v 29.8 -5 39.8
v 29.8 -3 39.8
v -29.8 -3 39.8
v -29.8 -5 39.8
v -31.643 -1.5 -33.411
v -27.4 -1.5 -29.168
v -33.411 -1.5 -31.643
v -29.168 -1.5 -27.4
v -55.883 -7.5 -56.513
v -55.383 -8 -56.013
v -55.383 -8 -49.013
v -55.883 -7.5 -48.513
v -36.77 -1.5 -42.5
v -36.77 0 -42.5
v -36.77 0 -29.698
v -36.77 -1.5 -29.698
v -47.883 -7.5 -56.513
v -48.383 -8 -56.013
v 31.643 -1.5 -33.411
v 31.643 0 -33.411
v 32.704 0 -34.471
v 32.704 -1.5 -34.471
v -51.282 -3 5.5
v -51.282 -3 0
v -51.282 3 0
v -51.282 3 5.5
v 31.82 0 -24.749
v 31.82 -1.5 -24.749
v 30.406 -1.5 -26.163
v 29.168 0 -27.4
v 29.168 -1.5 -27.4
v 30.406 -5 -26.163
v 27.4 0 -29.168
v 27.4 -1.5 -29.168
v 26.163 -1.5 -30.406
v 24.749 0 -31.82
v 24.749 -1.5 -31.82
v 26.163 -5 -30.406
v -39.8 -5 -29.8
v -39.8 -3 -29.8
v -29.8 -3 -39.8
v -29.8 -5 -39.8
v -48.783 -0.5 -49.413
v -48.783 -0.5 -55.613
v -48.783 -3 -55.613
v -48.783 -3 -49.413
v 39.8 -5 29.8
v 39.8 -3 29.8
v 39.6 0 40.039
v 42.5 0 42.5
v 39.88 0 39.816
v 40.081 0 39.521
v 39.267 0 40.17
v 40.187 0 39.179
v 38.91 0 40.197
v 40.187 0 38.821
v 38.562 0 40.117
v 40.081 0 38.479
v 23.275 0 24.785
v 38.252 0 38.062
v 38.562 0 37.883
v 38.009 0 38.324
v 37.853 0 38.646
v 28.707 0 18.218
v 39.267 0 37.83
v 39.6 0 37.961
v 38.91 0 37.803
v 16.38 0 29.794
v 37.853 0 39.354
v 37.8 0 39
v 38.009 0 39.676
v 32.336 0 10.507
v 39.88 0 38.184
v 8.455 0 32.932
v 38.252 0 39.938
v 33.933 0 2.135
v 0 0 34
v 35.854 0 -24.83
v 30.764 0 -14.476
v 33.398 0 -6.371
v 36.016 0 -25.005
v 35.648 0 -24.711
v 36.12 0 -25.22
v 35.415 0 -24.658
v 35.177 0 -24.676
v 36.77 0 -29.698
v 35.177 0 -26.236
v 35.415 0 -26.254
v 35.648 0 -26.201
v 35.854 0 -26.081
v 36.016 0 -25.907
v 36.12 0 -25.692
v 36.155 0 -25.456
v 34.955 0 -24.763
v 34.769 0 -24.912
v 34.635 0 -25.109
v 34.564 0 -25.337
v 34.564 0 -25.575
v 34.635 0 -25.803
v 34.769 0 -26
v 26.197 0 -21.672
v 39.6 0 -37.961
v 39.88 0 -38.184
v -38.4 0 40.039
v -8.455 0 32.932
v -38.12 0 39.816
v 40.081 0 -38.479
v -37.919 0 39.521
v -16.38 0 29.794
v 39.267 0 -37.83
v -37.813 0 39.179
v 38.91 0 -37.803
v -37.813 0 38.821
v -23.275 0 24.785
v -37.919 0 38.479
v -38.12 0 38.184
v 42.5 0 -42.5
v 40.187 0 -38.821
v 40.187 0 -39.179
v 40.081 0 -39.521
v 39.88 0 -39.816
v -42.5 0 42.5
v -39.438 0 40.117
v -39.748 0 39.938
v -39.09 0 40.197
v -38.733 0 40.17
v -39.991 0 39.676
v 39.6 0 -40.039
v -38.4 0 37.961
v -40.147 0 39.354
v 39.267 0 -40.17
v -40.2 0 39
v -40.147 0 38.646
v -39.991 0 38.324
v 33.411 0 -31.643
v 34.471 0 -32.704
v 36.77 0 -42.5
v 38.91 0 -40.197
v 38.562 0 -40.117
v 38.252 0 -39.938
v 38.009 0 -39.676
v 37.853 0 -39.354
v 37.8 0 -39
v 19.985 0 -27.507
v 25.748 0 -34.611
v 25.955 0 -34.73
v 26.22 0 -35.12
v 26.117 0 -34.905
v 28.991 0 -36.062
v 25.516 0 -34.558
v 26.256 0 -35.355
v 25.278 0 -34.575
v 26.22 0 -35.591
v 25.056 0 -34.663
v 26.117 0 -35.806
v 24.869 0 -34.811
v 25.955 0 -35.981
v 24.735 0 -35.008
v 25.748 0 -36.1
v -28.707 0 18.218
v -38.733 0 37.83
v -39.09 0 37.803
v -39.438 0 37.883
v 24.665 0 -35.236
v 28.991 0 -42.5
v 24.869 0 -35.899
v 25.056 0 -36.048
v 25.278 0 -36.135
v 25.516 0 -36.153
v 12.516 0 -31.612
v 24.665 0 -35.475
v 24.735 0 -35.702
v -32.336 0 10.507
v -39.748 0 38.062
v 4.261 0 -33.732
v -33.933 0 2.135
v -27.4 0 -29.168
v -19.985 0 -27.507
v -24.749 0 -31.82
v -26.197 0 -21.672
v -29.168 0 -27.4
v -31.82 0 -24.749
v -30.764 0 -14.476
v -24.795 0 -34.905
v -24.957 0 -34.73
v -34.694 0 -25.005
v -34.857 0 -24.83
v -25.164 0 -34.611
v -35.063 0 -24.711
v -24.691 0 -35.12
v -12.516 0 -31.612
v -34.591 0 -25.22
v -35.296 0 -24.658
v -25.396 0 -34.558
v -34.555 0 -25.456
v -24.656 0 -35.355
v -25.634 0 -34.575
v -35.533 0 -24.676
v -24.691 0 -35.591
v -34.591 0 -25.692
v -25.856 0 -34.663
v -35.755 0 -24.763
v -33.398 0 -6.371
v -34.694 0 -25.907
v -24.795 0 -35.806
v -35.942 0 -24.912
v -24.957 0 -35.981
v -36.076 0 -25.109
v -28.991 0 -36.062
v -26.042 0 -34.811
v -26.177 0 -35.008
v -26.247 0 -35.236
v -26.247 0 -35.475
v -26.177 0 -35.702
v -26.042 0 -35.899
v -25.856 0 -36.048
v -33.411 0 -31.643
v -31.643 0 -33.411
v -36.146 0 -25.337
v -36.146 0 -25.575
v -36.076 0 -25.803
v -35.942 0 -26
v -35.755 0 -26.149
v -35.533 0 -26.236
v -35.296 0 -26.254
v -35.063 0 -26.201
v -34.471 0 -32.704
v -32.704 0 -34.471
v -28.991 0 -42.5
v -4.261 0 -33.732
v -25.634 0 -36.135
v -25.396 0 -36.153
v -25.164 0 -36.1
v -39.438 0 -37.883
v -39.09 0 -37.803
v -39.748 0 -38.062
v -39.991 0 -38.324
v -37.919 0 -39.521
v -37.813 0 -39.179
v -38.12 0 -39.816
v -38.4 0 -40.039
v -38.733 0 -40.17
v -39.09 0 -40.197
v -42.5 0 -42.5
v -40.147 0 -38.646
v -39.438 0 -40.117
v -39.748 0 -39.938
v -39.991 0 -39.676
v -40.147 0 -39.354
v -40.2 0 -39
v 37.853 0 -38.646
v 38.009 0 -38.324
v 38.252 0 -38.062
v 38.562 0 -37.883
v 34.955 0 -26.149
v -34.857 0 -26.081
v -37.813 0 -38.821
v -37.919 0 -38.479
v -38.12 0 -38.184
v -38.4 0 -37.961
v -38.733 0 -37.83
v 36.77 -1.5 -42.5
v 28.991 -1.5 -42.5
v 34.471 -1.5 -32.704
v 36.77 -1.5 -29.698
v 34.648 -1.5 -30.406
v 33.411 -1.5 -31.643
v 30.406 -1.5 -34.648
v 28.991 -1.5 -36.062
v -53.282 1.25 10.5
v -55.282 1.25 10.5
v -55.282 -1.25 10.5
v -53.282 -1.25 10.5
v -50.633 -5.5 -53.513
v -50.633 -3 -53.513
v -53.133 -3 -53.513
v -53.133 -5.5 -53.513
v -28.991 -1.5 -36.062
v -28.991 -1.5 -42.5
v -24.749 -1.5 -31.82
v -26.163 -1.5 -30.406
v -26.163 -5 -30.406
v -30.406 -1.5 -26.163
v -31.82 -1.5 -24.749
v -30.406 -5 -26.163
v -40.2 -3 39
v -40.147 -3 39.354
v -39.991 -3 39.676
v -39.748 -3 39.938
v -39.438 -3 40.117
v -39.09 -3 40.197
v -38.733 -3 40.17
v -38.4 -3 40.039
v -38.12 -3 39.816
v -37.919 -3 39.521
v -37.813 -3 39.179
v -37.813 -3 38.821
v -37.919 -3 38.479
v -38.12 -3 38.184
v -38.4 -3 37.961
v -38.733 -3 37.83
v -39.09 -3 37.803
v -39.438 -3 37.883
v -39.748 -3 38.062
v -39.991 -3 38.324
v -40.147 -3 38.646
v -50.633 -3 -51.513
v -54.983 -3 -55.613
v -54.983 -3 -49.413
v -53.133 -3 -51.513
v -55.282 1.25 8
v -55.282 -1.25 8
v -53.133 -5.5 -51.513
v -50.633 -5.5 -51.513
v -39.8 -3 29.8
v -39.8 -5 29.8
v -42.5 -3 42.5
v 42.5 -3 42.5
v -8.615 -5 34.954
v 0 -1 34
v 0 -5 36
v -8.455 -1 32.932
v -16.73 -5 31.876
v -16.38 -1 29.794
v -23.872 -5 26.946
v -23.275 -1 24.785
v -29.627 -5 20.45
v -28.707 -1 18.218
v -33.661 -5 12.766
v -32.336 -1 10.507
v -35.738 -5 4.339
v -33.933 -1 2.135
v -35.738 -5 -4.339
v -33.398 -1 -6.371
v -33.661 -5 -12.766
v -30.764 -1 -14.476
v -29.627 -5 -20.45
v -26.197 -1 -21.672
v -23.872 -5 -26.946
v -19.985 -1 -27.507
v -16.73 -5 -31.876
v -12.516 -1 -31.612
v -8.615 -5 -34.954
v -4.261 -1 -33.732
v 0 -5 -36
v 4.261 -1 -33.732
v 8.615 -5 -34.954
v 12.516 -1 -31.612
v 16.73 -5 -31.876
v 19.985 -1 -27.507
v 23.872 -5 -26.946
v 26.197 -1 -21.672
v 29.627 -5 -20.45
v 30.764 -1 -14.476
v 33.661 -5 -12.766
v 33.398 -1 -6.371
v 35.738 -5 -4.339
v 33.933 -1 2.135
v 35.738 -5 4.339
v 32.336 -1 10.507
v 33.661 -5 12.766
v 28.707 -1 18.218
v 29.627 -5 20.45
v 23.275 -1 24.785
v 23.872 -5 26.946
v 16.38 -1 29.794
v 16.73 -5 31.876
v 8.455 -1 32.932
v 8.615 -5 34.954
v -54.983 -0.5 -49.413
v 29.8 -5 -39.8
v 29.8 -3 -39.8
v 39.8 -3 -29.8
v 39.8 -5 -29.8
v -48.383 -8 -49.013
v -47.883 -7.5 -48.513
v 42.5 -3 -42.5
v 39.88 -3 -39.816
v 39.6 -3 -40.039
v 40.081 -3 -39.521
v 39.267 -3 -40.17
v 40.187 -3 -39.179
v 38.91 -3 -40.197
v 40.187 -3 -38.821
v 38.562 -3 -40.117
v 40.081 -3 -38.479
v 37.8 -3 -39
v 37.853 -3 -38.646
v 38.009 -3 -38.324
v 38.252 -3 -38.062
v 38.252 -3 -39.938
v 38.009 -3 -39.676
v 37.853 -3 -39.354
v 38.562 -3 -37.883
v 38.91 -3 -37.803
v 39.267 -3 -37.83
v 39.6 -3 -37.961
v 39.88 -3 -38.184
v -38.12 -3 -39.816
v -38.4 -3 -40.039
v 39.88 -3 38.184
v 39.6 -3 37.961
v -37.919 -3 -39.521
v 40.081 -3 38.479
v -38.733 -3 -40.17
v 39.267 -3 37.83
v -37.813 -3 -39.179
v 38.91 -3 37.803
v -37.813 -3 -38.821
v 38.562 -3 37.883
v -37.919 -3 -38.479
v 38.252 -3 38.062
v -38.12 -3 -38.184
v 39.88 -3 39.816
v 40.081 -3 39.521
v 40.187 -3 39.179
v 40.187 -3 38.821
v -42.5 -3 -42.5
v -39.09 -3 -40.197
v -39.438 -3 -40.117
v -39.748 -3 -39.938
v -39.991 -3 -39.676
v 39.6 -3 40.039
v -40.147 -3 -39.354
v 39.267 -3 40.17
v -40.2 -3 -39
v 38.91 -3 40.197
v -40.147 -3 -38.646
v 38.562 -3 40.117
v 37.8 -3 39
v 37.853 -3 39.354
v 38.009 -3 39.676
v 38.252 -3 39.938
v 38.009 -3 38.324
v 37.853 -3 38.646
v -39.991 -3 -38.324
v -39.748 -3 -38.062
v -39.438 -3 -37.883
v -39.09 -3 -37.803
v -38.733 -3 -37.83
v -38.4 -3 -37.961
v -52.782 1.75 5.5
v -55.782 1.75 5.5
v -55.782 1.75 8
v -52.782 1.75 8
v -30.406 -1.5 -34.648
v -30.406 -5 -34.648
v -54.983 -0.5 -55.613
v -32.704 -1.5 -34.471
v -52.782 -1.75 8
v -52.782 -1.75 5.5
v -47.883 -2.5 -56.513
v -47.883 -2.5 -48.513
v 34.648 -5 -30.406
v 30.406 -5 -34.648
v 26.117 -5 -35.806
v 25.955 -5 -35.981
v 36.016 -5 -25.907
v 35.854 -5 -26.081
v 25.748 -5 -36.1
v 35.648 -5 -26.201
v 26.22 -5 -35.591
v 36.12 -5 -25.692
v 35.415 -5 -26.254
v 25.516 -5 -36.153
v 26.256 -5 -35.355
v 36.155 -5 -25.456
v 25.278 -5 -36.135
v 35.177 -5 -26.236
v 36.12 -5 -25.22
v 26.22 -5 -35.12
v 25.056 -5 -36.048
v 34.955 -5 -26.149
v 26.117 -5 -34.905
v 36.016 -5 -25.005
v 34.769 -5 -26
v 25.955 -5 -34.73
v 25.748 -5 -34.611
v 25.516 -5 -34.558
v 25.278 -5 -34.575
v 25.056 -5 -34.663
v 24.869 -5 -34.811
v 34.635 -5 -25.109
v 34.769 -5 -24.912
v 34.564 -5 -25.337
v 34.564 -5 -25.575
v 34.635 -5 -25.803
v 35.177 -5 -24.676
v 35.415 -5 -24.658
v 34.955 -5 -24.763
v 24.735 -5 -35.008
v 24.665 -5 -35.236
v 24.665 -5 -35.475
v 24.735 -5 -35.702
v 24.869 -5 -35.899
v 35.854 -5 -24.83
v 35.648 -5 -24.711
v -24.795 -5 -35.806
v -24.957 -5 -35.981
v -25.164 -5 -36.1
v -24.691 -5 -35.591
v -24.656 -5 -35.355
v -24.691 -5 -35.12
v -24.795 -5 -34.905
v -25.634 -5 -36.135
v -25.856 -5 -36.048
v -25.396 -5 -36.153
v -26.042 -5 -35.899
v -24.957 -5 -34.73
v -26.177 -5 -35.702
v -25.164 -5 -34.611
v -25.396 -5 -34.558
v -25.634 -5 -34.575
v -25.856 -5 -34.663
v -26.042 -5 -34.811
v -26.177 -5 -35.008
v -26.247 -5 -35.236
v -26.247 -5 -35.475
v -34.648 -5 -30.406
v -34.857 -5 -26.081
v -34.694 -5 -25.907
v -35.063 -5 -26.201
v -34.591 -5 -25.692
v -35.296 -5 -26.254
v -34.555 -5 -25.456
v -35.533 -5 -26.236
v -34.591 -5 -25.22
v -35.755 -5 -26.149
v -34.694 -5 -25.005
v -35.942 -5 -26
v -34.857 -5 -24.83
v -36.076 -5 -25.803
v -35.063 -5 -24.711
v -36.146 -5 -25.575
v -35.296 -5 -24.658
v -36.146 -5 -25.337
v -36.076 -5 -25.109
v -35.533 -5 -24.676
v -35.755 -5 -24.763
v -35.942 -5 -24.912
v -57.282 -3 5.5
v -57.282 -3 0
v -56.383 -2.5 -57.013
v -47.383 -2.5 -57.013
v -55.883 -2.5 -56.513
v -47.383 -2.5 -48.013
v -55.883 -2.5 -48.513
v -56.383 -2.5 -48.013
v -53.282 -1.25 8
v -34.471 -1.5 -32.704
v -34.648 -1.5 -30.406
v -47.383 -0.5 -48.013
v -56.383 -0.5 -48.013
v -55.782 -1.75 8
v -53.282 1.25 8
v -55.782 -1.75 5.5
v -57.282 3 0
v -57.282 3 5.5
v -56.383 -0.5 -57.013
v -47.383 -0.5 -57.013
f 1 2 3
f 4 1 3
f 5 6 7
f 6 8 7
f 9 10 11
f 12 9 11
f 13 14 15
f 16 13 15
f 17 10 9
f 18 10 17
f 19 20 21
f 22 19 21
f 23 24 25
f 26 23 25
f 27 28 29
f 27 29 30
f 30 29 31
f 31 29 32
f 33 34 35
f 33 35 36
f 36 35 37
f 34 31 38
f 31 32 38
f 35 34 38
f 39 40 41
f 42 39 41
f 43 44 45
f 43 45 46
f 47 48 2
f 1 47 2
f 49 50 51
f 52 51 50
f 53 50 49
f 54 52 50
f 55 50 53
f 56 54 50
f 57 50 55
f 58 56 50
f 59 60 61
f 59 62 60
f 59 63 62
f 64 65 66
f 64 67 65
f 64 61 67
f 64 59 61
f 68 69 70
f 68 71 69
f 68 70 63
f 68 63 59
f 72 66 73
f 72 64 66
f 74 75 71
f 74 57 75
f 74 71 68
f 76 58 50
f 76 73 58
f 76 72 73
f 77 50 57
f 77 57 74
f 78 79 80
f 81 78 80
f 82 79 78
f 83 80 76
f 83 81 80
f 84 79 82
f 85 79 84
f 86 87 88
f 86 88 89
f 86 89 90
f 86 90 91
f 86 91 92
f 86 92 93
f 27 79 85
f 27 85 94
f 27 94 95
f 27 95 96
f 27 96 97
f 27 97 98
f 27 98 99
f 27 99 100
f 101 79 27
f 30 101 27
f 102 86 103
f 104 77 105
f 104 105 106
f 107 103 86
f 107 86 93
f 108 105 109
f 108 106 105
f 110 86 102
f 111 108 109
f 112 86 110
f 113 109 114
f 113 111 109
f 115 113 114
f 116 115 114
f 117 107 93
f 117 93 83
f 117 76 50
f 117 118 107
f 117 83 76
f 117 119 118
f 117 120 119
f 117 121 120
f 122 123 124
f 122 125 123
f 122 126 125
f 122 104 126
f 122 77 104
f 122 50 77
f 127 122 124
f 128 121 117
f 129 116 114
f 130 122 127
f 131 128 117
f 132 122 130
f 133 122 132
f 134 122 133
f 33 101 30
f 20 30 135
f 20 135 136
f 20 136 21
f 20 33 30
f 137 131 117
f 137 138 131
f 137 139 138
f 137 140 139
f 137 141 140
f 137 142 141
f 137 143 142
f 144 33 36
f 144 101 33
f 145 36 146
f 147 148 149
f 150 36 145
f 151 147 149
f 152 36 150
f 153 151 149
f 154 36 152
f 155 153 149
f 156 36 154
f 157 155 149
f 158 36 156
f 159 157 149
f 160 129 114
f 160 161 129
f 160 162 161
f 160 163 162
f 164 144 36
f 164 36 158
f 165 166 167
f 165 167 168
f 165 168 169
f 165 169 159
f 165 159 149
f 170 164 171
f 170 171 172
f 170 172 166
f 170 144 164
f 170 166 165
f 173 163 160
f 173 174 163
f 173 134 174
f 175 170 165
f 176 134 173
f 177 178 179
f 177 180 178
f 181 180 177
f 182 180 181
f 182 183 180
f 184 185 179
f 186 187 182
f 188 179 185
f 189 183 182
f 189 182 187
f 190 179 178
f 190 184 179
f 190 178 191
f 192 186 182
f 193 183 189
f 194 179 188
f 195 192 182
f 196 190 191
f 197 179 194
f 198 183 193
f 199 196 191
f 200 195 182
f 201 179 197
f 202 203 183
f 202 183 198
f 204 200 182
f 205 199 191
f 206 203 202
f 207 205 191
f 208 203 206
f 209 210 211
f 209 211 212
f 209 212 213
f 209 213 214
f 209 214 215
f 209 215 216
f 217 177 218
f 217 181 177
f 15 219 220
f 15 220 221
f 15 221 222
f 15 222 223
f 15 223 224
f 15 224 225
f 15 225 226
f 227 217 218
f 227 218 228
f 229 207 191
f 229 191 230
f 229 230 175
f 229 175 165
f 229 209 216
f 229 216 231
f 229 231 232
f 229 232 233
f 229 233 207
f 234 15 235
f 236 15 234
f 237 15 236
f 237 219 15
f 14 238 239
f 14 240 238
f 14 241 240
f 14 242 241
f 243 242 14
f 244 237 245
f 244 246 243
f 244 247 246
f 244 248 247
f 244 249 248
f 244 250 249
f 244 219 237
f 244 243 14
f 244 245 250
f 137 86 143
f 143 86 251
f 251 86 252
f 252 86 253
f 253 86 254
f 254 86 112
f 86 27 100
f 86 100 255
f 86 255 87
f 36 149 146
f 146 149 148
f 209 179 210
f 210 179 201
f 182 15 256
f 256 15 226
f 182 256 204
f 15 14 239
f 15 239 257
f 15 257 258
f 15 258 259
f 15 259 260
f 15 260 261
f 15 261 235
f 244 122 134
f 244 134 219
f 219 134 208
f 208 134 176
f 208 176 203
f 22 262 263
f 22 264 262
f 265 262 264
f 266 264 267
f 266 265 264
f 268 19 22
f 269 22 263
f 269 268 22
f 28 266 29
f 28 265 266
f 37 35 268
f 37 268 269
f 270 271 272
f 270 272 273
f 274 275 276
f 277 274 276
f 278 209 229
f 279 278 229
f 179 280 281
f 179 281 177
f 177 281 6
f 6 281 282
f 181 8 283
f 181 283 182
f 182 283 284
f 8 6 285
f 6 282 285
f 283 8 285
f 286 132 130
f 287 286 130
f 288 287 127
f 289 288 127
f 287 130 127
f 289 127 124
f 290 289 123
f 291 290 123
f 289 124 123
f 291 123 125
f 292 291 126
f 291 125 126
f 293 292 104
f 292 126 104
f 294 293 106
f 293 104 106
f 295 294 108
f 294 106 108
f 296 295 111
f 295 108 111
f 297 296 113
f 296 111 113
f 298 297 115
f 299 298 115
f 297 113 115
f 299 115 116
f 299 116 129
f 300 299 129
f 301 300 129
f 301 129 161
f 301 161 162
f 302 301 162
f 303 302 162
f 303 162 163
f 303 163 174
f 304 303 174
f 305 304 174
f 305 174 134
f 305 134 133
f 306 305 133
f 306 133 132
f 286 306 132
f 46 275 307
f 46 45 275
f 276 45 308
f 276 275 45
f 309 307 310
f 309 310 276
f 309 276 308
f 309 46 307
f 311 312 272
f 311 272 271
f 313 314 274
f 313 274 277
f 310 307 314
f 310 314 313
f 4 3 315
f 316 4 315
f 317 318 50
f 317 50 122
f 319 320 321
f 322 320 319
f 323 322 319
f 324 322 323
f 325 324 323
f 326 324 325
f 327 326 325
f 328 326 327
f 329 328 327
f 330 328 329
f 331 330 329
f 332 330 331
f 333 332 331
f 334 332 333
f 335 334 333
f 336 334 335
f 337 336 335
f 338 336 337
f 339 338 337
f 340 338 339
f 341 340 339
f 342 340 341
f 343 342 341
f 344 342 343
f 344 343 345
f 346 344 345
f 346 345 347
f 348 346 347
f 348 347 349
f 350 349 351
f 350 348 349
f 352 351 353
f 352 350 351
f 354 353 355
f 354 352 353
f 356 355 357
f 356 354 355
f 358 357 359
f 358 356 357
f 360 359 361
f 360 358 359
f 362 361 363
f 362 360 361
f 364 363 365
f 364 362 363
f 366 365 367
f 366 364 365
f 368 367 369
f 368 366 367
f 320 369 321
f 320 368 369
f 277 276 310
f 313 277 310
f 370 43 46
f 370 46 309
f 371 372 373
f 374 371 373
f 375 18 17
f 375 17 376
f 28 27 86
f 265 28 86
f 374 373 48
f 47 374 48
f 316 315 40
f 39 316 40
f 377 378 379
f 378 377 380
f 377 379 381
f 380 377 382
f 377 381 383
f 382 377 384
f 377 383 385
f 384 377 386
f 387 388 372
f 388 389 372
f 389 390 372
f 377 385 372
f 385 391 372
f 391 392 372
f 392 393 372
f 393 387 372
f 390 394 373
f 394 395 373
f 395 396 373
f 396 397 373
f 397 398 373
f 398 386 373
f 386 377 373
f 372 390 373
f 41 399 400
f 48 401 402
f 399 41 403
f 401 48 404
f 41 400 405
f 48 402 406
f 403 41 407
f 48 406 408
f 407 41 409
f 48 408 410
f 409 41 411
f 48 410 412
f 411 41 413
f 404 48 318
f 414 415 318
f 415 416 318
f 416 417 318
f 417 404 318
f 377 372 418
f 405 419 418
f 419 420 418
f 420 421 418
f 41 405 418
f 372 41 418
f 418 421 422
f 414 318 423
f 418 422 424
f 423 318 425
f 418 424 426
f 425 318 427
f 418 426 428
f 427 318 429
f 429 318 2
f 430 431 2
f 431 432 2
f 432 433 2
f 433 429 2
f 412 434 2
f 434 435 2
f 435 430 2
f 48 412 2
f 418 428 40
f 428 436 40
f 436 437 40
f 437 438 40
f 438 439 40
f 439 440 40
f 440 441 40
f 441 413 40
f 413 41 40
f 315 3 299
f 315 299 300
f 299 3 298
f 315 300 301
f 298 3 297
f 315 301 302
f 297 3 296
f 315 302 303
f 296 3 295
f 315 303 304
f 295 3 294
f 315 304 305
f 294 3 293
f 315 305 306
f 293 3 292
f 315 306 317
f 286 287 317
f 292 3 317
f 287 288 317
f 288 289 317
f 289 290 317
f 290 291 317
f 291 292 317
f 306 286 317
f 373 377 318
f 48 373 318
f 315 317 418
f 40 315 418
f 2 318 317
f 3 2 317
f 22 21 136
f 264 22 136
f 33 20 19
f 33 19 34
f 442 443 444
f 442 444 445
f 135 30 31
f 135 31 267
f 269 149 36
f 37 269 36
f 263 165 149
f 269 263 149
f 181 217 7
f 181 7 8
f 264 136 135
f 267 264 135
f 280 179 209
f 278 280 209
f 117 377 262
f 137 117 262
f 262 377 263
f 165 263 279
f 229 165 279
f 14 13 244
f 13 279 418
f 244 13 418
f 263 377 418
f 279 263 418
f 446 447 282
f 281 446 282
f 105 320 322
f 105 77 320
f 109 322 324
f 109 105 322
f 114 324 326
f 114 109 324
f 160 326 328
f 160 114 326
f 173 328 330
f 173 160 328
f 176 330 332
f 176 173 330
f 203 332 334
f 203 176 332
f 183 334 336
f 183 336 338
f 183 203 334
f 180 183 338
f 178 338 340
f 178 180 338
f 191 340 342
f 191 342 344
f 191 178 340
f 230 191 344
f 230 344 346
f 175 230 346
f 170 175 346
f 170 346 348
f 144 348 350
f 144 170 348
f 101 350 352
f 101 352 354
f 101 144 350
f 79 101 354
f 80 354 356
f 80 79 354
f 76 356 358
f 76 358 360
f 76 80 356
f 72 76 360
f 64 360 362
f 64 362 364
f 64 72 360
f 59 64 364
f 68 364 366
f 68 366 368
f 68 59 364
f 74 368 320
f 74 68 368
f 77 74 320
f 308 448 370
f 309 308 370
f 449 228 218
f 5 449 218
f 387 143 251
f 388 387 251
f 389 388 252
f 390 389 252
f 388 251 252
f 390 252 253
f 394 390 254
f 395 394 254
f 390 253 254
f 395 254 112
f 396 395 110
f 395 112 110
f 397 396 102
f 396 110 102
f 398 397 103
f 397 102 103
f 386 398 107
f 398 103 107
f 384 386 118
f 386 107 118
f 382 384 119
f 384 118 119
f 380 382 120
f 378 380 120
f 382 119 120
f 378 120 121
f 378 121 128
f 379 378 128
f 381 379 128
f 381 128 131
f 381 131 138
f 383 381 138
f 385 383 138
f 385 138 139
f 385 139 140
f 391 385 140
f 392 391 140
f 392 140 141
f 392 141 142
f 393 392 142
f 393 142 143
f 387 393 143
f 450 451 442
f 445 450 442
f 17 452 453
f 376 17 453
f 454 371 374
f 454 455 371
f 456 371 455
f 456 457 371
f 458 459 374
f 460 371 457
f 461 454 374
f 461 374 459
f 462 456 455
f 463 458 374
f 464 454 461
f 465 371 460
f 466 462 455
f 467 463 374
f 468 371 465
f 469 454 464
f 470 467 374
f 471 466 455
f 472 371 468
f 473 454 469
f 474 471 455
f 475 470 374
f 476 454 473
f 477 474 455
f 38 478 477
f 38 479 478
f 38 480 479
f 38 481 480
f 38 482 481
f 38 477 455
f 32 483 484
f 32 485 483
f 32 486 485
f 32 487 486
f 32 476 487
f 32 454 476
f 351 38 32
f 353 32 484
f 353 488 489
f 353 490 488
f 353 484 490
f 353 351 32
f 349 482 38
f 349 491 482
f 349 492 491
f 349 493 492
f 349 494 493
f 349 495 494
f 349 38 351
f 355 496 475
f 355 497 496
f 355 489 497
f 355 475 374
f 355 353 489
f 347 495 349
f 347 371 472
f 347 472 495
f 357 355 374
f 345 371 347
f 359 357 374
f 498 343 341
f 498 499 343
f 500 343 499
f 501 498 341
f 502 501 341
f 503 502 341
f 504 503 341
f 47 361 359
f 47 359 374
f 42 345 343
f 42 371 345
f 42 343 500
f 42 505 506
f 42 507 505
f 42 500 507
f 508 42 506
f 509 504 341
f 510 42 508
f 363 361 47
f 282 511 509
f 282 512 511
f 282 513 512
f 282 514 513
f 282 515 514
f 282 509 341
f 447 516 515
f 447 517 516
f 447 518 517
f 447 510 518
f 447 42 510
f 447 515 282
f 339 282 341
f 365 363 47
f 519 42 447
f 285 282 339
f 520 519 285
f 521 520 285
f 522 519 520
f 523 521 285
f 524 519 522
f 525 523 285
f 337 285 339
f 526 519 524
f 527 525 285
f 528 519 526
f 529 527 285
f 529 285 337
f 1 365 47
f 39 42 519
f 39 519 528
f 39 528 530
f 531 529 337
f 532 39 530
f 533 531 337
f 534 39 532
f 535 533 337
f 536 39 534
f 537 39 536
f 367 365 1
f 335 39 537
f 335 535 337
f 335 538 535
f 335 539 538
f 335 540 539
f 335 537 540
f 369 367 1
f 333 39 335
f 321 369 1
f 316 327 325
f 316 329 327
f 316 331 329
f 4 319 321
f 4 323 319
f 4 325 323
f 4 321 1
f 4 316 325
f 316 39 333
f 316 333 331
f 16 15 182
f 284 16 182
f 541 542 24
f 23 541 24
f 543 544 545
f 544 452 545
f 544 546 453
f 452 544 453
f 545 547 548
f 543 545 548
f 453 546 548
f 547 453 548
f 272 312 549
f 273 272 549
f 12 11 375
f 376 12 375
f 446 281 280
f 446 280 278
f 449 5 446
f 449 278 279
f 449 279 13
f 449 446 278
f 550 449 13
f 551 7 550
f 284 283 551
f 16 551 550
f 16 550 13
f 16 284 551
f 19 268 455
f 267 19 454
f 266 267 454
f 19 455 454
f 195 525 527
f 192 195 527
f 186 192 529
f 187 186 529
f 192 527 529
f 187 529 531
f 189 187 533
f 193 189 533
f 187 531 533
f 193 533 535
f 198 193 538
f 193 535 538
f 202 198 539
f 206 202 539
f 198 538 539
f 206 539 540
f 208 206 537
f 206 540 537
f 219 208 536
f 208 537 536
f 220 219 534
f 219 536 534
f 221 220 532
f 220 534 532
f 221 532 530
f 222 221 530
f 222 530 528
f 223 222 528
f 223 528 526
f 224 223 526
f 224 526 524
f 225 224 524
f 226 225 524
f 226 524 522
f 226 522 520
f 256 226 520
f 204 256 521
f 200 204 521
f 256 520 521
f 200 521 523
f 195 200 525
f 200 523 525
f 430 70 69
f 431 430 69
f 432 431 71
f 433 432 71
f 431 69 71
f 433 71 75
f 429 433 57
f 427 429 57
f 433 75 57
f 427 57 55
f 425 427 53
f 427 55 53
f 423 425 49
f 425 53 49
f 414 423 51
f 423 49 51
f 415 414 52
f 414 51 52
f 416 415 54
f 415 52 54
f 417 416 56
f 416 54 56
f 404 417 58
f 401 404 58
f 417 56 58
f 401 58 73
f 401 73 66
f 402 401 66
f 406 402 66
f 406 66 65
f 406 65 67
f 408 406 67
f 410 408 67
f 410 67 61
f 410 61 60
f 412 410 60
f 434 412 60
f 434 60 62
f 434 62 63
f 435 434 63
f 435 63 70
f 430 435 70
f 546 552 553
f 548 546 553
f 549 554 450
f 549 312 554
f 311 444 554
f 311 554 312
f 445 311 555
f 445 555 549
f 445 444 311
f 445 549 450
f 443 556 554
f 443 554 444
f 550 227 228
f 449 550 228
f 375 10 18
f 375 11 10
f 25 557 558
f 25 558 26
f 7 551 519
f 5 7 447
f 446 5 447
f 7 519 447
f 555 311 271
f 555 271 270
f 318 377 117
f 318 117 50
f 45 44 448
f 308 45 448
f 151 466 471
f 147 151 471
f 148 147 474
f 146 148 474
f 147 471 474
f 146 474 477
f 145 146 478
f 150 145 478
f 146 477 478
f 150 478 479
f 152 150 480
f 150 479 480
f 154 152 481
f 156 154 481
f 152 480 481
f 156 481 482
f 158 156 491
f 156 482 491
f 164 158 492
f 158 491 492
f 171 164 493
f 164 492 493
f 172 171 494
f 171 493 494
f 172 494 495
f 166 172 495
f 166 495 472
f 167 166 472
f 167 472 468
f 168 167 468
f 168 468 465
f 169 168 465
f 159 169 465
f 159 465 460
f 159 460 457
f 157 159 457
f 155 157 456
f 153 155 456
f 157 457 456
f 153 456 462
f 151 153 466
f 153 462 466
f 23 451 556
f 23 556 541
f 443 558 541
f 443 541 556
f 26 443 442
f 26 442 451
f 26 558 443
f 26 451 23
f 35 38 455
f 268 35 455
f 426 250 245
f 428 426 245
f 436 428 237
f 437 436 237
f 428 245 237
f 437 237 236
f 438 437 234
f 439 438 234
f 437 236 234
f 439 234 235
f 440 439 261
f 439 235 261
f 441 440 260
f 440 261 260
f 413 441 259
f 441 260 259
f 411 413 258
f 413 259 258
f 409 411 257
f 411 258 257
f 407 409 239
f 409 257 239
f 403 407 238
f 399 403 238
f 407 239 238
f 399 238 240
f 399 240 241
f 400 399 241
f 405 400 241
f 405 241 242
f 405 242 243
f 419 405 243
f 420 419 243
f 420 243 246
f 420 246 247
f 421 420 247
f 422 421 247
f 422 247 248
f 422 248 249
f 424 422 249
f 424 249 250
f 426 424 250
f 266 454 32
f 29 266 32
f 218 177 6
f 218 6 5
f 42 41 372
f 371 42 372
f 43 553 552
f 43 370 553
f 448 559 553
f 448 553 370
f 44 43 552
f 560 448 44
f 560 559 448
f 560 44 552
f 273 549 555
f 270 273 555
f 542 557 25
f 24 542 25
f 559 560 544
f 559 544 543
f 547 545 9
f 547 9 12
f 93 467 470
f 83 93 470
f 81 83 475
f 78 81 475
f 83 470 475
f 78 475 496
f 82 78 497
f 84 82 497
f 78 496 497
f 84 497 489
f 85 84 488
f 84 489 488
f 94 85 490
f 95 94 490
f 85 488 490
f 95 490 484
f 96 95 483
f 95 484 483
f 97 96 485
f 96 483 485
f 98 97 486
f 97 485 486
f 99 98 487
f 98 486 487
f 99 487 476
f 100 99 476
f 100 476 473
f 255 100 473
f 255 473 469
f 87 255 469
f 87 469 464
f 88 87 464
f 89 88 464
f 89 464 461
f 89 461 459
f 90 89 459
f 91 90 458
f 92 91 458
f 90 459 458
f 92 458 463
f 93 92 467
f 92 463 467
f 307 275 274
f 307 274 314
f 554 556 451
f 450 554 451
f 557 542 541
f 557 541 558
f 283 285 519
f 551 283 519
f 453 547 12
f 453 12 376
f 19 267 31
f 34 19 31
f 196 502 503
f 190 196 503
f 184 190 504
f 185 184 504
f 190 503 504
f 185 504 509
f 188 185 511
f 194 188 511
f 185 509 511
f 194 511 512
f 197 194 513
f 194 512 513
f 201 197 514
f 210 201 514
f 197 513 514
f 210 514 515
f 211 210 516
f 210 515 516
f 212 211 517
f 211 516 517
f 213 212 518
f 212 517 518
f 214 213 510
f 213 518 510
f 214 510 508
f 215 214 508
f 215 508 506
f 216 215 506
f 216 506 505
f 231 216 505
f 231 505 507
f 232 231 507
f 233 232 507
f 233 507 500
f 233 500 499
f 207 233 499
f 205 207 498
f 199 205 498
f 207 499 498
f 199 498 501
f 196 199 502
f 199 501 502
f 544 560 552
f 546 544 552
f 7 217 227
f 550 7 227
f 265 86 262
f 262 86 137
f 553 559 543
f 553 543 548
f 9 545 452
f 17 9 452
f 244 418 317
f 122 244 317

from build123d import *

# Parameters (mm, degrees)
F2_DEPTH  = 2
F3_W      = 85
F3_H      = 85
F4_DEPTH  = 3
F6_D      = 2.4
F7_D      = 76
F10_R     = 0.8
F11_DEPTH = 5
F13_DEPTH = 1.5
F14_W     = 8
F14_H     = 8
F15_DEPTH = 8
F16_W     = 6.2
F16_H     = 6.2
F17_DEPTH = 3
F18_W     = 2.5
F18_H     = 2
F19_DEPTH = 2.5
F20_W     = 9
F20_H     = 9
F20_W_2   = 8
F20_H_2   = 8
F21_DEPTH = 2.5
F23_DEPTH = 1.5
F24_W     = 6
F24_H     = 6
F25_DEPTH = 5.5
F26_W     = 3
F26_H     = 3.5
F27_DEPTH = 2.5
F28_W     = 2
F28_H     = 2.5
F29_DEPTH = 2.5
F30_SIZE  = 0.5
F31_W     = 9
F31_H     = 0.5
F32_DEPTH = 25


with BuildPart() as f2:
    # F1 (on offset) → F2 (new body)
    with BuildSketch(Plane.XZ.offset(3)):
        Polygon((39.8, 0), (39.8, 29.8), (29.8, 39.8), (0, 39.8), (-29.8, 39.8), (-39.8, 29.8), (-39.8, 0), (-39.8, -29.8), (-29.8, -39.8), (0, -39.8), (29.8, -39.8), (39.8, -29.8), align=None)
    extrude(amount=F2_DEPTH)

    # F3 (on face) → F4 (join)
    with BuildSketch(Plane(origin=(0, -3, 0), x_dir=(-1, 0, 0), z_dir=(0, 1, 0))):
        Rectangle(F3_W, F3_H)
    extrude(amount=F4_DEPTH)

    # F6 (through all)
    with Locations(Plane.XZ.offset(5)):
        with Locations((-39, 39), (39, 39), (39, -39), (-39, -39)):
            Hole(F6_D / 2)

    # F7 (through all)
    with Locations(Plane.XZ.offset(5)):
        with Locations((0, 0)):
            Hole(F7_D / 2)

    # F8 (on Right) → F9 (revolve)
    with BuildSketch(Plane.YZ):
        Polygon((0, 38), (-5, 38), (-5, 36), (-1, 34), (0, 34), align=None)
    revolve(axis=Axis((0, -12.2109930962, 0), (0, -1, 0)))

    # F10 (on face) → F11 (cut)
    with BuildSketch(Plane.XZ.offset(5)):
        Polygon((-30.405591591, -34.6482322781), (-26.1629509039, -30.405591591), (-30.405591591, -26.1629509039), (-34.6482322781, -30.405591591), align=None)
        with Locations((-35.3553390593, -25.4558441227)):
            Circle(F10_R)
        with Locations((-25.4558441227, -35.3553390593)):
            Circle(F10_R)
        with Locations((25.4558441227, -35.3553390593)):
            Circle(F10_R)
        with Locations((35.3553390593, -25.4558441227)):
            Circle(F10_R)
        Polygon((26.1629509039, -30.405591591), (30.405591591, -34.6482322781), (34.6482322781, -30.405591591), (30.405591591, -26.1629509039), align=None)
    extrude(amount=-F11_DEPTH, mode=Mode.SUBTRACT)

    # F12 (on face) → F13 (join)
    with BuildSketch(Plane(origin=(0, 0, 0), x_dir=(-1, 0, 0), z_dir=(0, 1, 0))):
        Polygon((27.400387771, -29.1681547239), (31.6430284581, -33.4107954111), (33.4107954111, -31.6430284581), (29.1681547239, -27.400387771), align=None)
        Polygon((-27.400387771, -29.1681547239), (-29.1681547239, -27.400387771), (-33.4107954111, -31.6430284581), (-31.6430284581, -33.4107954111), align=None)
    extrude(amount=-F13_DEPTH)

    # F22 (on face) → F23 (cut)
    with BuildSketch(Plane(origin=(0, 0, 0), x_dir=(-1, 0, 0), z_dir=(0, 1, 0))):
        Polygon((31.6430284581, -33.4107954111), (30.405591591, -34.6482322781), (26.1629509039, -30.405591591), (24.7487373415, -31.8198051534), (28.9913780286, -36.0624458405), (28.9913780286, -42.5), (36.7695526217, -42.5), (36.7695526217, -29.6984848098), (31.8198051534, -24.7487373415), (30.405591591, -26.1629509039), (34.6482322781, -30.405591591), (33.4107954111, -31.6430284581), (34.4714555828, -32.7036886299), (32.7036886299, -34.4714555828), align=None)
        Polygon((-26.1629509039, -30.405591591), (-30.405591591, -34.6482322781), (-31.6430284581, -33.4107954111), (-32.7036886299, -34.4714555828), (-34.4714555828, -32.7036886299), (-33.4107954111, -31.6430284581), (-34.6482322781, -30.405591591), (-30.405591591, -26.1629509039), (-31.8198051534, -24.7487373415), (-36.7695526217, -29.6984848098), (-36.7695526217, -42.5), (-28.9913780286, -42.5), (-28.9913780286, -36.0624458405), (-24.7487373415, -31.8198051534), align=None)
    extrude(amount=-F23_DEPTH, mode=Mode.SUBTRACT)


with BuildPart() as f15:
    # F14 (on Front) → F15 (new body)
    with BuildSketch(Plane.XZ):
        with Locations((-51.8833158314, -52.5134520829)):
            Rectangle(F14_W, F14_H)
    extrude(amount=F15_DEPTH)

    # F16 (on face) → F17 (cut)
    with BuildSketch(Plane(origin=(0, 0, 0), x_dir=(-1, 0, 0), z_dir=(0, 1, 0))):
        with Locations((51.8833158314, -52.5134520829)):
            Rectangle(F16_W, F16_H)
    extrude(amount=-F17_DEPTH, mode=Mode.SUBTRACT)

    # F18 (on face) → F19 (cut)
    with BuildSketch(Plane(origin=(0, -3, 0), x_dir=(-1, 0, 0), z_dir=(0, 1, 0))):
        with Locations((51.8833158314, -52.5134520829)):
            Rectangle(F18_W, F18_H)
    extrude(amount=-F19_DEPTH, mode=Mode.SUBTRACT)

    # F20 (on face) → F21 (join)
    with BuildSketch(Plane(origin=(0, 0, 0), x_dir=(-1, 0, 0), z_dir=(0, 1, 0))):
        with Locations((51.8833158314, -52.5134520829)):
            Rectangle(F20_W, F20_H)
        with Locations((51.8833158314, -52.5134520829)):
            Rectangle(F20_W_2, F20_H_2, mode=Mode.SUBTRACT)
    extrude(amount=-F21_DEPTH)

    # F30
    f30_edges = [f15.edges().sort_by_distance(p)[0] for p in [
        (-51.883316, -8, -56.513452),
        (-47.883316, -8, -52.513452),
        (-51.883316, -8, -48.513452),
        (-55.883316, -8, -52.513452),
    ]]
    chamfer(f30_edges, length=F30_SIZE)

    # F31 (on face) → F32 (cut)
    with BuildSketch(Plane(origin=(0, 0, -57.0134520829), x_dir=(1, 0, 0), z_dir=(0, 0, -1))):
        with Locations((-51.8833158314, 0.25)):
            Rectangle(F31_W, F31_H)
    extrude(amount=-F32_DEPTH, mode=Mode.SUBTRACT)


with BuildPart() as f25:
    # F24 (on Top) → F25 (new body)
    with BuildSketch(Plane.XY):
        with Locations((-54.2820803821, 0)):
            Rectangle(F24_W, F24_H)
    extrude(amount=F25_DEPTH)

    # F26 (on face) → F27 (join)
    with BuildSketch(Plane.XY.offset(5.5)):
        with Locations((-54.2820803821, 0)):
            Rectangle(F26_W, F26_H)
    extrude(amount=F27_DEPTH)

    # F28 (on face) → F29 (join)
    with BuildSketch(Plane.XY.offset(8)):
        with Locations((-54.2820803821, 0)):
            Rectangle(F28_W, F28_H)
    extrude(amount=F29_DEPTH)


solid = Compound([f2.part, f15.part, f25.part])
